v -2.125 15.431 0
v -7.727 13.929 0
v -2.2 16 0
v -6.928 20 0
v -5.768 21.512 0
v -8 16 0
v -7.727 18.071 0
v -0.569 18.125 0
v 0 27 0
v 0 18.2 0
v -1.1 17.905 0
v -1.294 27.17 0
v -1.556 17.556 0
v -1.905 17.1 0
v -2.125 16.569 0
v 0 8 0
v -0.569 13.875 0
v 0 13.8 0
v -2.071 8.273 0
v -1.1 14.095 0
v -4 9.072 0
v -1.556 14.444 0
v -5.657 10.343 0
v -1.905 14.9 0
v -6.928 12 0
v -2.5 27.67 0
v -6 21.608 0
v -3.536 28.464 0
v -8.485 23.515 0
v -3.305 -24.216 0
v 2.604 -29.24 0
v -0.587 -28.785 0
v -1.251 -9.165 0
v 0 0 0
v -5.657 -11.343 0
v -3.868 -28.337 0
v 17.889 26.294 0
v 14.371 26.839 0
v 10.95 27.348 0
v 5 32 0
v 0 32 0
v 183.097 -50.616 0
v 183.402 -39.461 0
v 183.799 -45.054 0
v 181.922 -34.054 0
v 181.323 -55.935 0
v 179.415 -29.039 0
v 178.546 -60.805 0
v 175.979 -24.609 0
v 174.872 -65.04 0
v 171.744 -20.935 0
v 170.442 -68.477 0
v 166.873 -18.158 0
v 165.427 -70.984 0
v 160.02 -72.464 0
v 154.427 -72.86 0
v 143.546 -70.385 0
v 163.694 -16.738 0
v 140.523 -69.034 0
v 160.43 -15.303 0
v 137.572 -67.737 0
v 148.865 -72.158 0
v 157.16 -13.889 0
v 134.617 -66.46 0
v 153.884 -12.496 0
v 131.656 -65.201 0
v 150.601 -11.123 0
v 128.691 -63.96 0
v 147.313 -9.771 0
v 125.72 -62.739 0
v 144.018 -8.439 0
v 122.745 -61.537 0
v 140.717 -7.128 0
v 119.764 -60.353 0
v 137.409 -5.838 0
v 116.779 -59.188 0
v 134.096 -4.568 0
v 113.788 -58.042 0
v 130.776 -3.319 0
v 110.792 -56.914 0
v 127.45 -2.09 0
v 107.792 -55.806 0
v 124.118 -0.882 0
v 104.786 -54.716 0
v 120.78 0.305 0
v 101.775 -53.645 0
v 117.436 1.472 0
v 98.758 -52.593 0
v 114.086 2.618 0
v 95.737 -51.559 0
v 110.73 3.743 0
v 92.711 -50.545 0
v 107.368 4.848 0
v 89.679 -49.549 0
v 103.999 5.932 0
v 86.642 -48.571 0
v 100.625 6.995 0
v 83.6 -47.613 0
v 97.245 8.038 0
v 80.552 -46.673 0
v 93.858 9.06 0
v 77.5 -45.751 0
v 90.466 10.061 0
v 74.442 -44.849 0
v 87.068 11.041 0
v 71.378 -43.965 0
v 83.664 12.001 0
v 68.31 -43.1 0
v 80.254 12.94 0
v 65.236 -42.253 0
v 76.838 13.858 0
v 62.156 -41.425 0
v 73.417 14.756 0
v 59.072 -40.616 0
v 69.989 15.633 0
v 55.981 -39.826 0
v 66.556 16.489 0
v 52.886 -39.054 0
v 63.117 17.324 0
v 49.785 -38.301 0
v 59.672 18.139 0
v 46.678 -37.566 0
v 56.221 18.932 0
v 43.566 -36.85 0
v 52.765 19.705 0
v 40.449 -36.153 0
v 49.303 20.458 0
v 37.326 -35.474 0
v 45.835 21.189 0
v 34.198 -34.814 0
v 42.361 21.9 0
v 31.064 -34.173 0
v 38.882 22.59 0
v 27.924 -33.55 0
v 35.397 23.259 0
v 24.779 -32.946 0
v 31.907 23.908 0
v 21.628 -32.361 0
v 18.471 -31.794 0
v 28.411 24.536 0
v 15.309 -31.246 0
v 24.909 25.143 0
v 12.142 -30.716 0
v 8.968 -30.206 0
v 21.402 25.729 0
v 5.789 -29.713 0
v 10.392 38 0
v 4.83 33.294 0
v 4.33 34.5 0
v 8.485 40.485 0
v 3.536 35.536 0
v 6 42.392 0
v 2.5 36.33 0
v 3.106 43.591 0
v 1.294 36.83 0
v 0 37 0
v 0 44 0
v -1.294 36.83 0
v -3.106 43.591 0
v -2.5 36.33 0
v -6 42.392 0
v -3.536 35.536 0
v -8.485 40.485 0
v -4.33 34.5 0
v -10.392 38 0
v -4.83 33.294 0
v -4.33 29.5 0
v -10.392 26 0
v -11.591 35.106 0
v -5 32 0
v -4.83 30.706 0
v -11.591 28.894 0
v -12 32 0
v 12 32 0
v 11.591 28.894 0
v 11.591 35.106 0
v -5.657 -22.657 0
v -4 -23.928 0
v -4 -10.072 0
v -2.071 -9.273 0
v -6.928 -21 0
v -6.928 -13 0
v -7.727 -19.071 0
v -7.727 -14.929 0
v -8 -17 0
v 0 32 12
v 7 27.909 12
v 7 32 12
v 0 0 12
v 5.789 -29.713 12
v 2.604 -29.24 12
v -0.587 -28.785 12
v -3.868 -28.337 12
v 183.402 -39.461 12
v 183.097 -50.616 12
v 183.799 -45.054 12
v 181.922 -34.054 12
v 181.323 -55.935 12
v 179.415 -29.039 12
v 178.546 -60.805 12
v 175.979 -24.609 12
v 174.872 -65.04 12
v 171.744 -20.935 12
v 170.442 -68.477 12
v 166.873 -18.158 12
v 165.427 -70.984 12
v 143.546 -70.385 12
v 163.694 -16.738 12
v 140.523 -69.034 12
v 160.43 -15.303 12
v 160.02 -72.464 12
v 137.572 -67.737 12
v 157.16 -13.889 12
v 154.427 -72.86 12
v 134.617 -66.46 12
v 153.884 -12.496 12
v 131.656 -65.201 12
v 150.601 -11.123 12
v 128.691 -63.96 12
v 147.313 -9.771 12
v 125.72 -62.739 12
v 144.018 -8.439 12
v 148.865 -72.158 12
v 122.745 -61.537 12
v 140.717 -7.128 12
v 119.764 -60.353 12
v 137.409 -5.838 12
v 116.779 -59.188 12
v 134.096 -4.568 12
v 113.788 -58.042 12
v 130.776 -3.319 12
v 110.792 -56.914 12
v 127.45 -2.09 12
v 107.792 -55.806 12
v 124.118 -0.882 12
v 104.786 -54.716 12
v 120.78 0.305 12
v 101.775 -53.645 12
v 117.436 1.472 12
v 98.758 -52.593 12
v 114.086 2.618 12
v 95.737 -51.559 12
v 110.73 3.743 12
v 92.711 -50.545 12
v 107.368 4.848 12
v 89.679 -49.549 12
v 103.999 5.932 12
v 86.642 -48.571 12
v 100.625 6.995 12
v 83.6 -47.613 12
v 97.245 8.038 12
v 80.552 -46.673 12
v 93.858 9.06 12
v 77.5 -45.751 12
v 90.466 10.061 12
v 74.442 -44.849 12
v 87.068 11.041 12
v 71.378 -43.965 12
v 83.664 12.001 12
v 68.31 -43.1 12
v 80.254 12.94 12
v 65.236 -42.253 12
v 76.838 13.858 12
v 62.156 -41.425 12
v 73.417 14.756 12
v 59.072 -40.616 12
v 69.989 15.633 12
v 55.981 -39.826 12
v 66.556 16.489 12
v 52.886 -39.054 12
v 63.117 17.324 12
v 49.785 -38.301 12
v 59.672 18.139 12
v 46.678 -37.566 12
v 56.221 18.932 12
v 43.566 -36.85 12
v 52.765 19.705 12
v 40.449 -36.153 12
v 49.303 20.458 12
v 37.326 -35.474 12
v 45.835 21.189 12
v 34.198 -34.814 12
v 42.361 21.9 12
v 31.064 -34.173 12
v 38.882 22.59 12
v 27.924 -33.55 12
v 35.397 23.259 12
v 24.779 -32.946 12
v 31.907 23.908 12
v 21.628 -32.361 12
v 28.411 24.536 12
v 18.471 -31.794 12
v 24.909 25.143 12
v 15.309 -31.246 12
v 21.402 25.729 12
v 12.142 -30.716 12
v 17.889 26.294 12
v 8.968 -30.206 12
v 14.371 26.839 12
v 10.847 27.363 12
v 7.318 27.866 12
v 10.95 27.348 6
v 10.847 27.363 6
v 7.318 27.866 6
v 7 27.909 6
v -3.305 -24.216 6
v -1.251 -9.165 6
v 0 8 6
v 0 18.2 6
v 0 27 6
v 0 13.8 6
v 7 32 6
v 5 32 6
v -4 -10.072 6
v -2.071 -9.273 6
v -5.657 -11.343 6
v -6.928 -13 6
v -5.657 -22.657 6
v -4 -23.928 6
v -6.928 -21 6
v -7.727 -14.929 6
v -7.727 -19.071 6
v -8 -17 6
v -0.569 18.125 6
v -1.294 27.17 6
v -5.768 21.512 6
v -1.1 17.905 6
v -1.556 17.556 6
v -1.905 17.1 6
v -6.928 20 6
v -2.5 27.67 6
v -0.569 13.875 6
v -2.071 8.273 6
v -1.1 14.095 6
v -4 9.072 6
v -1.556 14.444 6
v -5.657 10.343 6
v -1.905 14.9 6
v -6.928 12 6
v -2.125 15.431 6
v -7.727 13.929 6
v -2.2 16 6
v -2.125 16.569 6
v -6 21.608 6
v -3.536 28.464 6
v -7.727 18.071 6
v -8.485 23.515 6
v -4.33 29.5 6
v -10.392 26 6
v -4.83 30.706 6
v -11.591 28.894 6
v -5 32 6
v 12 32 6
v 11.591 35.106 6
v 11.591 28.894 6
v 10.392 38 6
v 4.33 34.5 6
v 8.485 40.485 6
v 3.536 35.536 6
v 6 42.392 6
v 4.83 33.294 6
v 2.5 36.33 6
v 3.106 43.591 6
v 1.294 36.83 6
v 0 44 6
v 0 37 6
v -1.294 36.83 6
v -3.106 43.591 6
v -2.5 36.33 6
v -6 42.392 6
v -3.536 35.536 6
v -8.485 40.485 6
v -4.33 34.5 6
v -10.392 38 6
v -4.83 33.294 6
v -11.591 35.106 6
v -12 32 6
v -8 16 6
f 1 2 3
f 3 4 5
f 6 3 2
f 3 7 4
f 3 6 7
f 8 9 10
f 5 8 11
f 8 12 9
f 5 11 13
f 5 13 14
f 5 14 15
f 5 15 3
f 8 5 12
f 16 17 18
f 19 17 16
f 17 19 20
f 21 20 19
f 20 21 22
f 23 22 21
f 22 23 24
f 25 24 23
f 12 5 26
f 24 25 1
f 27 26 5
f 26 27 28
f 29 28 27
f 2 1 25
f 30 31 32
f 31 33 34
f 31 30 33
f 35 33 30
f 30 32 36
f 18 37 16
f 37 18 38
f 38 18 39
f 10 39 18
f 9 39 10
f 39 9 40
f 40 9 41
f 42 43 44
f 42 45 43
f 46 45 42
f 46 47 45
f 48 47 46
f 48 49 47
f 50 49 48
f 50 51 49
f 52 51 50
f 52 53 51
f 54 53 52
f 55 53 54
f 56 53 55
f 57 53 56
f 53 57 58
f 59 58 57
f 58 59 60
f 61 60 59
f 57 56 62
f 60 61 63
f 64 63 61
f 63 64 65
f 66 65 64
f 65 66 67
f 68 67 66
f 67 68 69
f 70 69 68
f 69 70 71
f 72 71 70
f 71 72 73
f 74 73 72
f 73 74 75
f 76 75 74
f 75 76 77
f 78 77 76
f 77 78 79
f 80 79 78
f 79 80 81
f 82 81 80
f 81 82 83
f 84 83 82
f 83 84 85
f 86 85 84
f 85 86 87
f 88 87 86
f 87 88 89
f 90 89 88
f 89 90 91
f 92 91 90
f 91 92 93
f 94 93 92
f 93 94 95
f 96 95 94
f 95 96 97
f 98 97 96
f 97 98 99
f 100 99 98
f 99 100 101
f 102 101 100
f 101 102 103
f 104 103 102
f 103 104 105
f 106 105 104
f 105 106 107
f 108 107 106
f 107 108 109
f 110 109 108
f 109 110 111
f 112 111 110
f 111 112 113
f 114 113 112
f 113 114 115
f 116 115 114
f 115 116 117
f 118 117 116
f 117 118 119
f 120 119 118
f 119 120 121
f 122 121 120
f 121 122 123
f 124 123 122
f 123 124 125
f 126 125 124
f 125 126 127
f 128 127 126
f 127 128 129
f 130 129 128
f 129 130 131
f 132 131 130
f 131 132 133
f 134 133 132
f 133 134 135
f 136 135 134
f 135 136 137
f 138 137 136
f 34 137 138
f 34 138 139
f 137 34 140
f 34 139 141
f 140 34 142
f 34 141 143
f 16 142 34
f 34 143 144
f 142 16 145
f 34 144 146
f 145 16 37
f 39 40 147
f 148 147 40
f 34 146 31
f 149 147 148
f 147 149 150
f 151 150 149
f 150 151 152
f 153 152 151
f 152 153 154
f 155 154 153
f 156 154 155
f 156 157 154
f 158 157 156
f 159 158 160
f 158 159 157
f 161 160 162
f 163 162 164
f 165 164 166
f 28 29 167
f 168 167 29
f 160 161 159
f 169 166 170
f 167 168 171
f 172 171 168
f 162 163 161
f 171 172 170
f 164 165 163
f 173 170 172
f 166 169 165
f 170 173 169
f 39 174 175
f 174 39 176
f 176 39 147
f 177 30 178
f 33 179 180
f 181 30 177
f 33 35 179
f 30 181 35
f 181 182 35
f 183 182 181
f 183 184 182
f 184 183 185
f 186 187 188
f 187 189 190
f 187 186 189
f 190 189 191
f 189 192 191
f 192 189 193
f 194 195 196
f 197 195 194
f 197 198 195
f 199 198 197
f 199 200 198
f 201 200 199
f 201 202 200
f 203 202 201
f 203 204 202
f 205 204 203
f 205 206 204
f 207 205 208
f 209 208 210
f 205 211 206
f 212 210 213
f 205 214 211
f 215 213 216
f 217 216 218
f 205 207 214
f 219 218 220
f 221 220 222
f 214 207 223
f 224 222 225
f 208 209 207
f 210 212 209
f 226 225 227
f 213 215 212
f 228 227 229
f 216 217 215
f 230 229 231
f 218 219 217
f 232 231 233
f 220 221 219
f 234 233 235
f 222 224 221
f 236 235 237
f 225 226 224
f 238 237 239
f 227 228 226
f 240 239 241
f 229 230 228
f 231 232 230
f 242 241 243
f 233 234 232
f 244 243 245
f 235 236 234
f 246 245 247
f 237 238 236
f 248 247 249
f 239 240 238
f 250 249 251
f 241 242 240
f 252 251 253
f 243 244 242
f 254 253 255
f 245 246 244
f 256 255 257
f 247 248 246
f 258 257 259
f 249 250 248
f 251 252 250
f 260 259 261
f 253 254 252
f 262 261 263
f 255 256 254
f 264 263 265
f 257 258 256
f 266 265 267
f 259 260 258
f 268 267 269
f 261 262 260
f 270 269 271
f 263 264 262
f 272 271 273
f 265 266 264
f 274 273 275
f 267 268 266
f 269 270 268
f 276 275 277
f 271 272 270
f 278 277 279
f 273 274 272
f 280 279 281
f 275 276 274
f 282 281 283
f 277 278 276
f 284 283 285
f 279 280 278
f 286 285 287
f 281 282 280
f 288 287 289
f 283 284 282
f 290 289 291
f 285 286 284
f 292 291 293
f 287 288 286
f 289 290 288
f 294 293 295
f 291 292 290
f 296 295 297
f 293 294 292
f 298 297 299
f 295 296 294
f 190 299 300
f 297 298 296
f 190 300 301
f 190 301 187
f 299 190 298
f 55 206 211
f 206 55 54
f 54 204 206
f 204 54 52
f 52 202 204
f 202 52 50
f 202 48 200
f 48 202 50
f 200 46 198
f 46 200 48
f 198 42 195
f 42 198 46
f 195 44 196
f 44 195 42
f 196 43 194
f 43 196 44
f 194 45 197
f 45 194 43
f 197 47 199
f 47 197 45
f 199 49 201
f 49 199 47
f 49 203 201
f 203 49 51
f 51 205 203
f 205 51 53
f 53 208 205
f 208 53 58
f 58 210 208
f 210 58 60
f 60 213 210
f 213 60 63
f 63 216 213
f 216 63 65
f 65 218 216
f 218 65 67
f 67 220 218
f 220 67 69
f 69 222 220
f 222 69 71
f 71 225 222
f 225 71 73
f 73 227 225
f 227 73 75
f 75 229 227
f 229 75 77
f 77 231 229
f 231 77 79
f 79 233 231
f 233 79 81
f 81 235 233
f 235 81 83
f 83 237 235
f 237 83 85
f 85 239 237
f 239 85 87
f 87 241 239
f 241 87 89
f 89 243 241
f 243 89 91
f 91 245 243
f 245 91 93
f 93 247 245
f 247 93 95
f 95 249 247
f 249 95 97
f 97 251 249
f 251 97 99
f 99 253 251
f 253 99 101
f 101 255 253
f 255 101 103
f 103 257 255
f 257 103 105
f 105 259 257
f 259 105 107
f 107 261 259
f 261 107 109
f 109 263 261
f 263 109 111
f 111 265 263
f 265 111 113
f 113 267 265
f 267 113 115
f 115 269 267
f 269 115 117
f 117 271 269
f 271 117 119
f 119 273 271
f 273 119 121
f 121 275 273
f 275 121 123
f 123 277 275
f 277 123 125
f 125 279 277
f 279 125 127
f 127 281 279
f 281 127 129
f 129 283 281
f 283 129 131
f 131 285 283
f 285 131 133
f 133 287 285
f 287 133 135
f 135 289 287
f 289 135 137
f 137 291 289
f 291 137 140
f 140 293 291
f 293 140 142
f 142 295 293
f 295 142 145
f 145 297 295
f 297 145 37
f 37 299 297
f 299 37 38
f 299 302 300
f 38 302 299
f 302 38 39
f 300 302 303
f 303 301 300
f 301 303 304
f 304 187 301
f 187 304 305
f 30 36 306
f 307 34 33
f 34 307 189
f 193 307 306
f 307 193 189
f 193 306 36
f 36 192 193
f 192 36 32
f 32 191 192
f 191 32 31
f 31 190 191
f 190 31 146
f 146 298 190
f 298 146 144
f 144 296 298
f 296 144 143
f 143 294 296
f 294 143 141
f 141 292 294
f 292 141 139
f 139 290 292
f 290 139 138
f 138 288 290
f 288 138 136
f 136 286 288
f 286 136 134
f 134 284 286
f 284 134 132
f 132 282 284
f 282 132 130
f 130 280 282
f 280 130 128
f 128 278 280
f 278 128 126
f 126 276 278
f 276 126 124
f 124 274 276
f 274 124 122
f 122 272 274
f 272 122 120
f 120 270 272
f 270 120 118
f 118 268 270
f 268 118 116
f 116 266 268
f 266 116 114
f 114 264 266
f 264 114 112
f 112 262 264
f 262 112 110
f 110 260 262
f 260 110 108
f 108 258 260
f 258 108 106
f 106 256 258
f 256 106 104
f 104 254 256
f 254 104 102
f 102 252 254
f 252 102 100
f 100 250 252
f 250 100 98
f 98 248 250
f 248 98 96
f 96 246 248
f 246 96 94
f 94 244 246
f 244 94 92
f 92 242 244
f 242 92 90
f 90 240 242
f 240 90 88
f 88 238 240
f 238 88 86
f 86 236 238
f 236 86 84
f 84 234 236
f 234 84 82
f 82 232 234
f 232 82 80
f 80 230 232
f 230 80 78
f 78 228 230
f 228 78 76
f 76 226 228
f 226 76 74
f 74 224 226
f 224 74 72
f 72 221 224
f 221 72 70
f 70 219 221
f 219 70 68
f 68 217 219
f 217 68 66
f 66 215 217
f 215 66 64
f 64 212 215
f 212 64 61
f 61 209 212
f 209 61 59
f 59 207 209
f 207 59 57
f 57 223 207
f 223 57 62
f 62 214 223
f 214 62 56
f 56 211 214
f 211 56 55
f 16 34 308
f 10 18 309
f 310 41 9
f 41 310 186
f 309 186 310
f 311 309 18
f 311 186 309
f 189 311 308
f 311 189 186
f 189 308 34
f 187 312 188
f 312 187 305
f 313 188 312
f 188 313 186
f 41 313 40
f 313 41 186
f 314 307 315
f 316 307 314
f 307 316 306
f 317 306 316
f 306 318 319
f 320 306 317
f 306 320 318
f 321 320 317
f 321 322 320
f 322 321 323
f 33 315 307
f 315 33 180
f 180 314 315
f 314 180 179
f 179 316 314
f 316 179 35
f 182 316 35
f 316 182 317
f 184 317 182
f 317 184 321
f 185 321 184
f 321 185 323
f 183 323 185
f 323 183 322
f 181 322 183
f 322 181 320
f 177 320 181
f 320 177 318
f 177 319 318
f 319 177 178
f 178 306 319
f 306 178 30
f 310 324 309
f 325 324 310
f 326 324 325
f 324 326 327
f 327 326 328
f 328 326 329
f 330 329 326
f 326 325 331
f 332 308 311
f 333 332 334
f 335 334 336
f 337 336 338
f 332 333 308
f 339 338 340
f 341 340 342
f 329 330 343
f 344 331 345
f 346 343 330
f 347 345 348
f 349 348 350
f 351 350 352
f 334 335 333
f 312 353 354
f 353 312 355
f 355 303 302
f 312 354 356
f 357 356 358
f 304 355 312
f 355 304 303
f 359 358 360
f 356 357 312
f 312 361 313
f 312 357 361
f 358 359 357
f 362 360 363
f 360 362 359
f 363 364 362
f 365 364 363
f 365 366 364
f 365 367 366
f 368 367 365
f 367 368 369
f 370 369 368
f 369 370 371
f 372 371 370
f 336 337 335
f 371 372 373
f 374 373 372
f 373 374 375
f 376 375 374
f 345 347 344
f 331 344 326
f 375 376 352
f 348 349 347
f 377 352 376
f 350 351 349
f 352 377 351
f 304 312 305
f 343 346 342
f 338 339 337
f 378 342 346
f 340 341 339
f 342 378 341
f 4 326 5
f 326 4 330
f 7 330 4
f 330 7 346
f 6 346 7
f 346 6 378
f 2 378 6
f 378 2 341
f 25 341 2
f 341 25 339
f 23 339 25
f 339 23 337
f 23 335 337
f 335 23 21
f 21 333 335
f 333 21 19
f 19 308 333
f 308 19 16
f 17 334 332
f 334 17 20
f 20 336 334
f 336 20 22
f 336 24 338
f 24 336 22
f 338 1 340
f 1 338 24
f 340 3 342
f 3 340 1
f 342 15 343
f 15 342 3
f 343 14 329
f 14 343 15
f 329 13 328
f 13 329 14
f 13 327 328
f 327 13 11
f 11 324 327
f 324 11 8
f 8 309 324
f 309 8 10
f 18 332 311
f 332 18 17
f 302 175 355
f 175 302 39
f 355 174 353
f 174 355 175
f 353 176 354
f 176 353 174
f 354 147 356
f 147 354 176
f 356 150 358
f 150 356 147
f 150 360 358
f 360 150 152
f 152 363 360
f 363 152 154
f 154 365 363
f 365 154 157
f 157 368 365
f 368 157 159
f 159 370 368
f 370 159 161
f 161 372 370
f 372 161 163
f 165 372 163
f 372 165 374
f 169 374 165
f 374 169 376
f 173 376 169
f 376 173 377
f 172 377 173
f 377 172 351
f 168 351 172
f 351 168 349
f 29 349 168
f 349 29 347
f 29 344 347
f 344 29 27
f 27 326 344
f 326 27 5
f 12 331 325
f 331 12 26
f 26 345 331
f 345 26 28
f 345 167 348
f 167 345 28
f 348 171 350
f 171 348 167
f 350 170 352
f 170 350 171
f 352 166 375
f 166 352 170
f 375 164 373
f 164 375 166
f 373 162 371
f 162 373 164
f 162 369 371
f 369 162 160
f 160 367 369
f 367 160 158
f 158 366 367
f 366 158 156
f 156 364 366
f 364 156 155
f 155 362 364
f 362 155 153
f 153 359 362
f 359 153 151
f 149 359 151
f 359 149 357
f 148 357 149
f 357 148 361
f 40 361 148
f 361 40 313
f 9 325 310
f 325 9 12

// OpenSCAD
// hanger-split: half w19 w=19 cm slope=15.92 deg bow=0.59 cm r=2.86 cm depth=12.0 mm
// Print this half twice, flat. Turn the second half 180 degrees about the vertical axis, lay the
// bosses together and clamp with two M4 bolts through the 4.4 mm holes.
// Generated by hanger_split.split.scad; not rendered in this run (no OpenSCAD in the image).
depth = 12.0;
union() {
  linear_extrude(height = 12) polygon([[3.868, 28.337], [7.318, 27.866], [10.847, 27.363], [14.371, 26.839], [17.889, 26.294], [21.402, 25.729], [24.909, 25.143], [28.411, 24.536], [31.907, 23.908], [35.397, 23.259], [38.882, 22.590], [42.361, 21.900], [45.835, 21.189], [49.303, 20.458], [52.765, 19.705], [56.221, 18.932], [59.672, 18.139], [63.117, 17.324], [66.556, 16.489], [69.989, 15.633], [73.417, 14.756], [76.838, 13.858], [80.254, 12.940], [83.664, 12.001], [87.068, 11.041], [90.466, 10.061], [93.858, 9.060], [97.245, 8.038], [100.625, 6.995], [103.999, 5.932], [107.368, 4.848], [110.730, 3.743], [114.086, 2.618], [117.436, 1.472], [120.780, 0.305], [124.118, -0.882], [127.450, -2.090], [130.776, -3.319], [134.096, -4.568], [137.409, -5.838], [140.717, -7.128], [144.018, -8.439], [147.313, -9.771], [150.601, -11.123], [153.884, -12.496], [157.160, -13.889], [160.430, -15.303], [163.694, -16.738], [166.873, -18.158], [171.744, -20.935], [175.979, -24.609], [179.415, -29.039], [181.922, -34.054], [183.402, -39.461], [183.799, -45.054], [183.097, -50.616], [181.323, -55.935], [178.546, -60.805], [174.872, -65.040], [170.442, -68.477], [165.427, -70.984], [160.020, -72.464], [154.427, -72.860], [148.865, -72.158], [143.546, -70.385], [140.523, -69.034], [137.572, -67.737], [134.617, -66.460], [131.656, -65.201], [128.691, -63.960], [125.720, -62.739], [122.745, -61.537], [119.764, -60.353], [116.779, -59.188], [113.788, -58.042], [110.792, -56.914], [107.792, -55.806], [104.786, -54.716], [101.775, -53.645], [98.758, -52.593], [95.737, -51.559], [92.711, -50.545], [89.679, -49.549], [86.642, -48.571], [83.600, -47.613], [80.552, -46.673], [77.500, -45.751], [74.442, -44.849], [71.378, -43.965], [68.310, -43.100], [65.236, -42.253], [62.156, -41.425], [59.072, -40.616], [55.981, -39.826], [52.886, -39.054], [49.785, -38.301], [46.678, -37.566], [43.566, -36.850], [40.449, -36.153], [37.326, -35.474], [34.198, -34.814], [31.064, -34.173], [27.924, -33.550], [24.779, -32.946], [21.628, -32.361], [18.471, -31.794], [15.309, -31.246], [12.142, -30.716], [8.968, -30.206], [5.789, -29.713], [2.604, -29.240], [-0.587, -28.785], [-3.868, -28.337]]);
  linear_extrude(height = 12) polygon([[0.000, -28.600], [7.402, -27.625], [14.300, -24.768], [20.223, -20.223], [24.768, -14.300], [27.625, -7.402], [28.600, -0.000], [27.625, 7.402], [24.768, 14.300], [20.223, 20.223], [14.300, 24.768], [7.402, 27.625], [0.000, 28.600]]);
  linear_extrude(height = 12) polygon([[0.000, 0.000], [7.000, 0.000], [7.000, 32.000], [0.000, 32.000]]);
  linear_extrude(height = 6) difference() { polygon([[8.000, -17.000], [7.727, -14.929], [6.928, -13.000], [5.657, -11.343], [4.000, -10.072], [2.071, -9.273], [0.000, -9.000], [-2.071, -9.273], [-4.000, -10.072], [-5.657, -11.343], [-6.928, -13.000], [-7.727, -14.929], [-8.000, -17.000], [-7.727, -19.071], [-6.928, -21.000], [-5.657, -22.657], [-4.000, -23.928], [-2.071, -24.727], [-0.000, -25.000], [2.071, -24.727], [4.000, -23.928], [5.657, -22.657], [6.928, -21.000], [7.727, -19.071]]); polygon([[2.200, -17.000], [2.125, -16.431], [1.905, -15.900], [1.556, -15.444], [1.100, -15.095], [0.569, -14.875], [0.000, -14.800], [-0.569, -14.875], [-1.100, -15.095], [-1.556, -15.444], [-1.905, -15.900], [-2.125, -16.431], [-2.200, -17.000], [-2.125, -17.569], [-1.905, -18.100], [-1.556, -18.556], [-1.100, -18.905], [-0.569, -19.125], [-0.000, -19.200], [0.569, -19.125], [1.100, -18.905], [1.556, -18.556], [1.905, -18.100], [2.125, -17.569]]); }
  linear_extrude(height = 6) difference() { polygon([[8.000, 16.000], [7.727, 18.071], [6.928, 20.000], [5.657, 21.657], [4.000, 22.928], [2.071, 23.727], [0.000, 24.000], [-2.071, 23.727], [-4.000, 22.928], [-5.657, 21.657], [-6.928, 20.000], [-7.727, 18.071], [-8.000, 16.000], [-7.727, 13.929], [-6.928, 12.000], [-5.657, 10.343], [-4.000, 9.072], [-2.071, 8.273], [-0.000, 8.000], [2.071, 8.273], [4.000, 9.072], [5.657, 10.343], [6.928, 12.000], [7.727, 13.929]]); polygon([[2.200, 16.000], [2.125, 16.569], [1.905, 17.100], [1.556, 17.556], [1.100, 17.905], [0.569, 18.125], [0.000, 18.200], [-0.569, 18.125], [-1.100, 17.905], [-1.556, 17.556], [-1.905, 17.100], [-2.125, 16.569], [-2.200, 16.000], [-2.125, 15.431], [-1.905, 14.900], [-1.556, 14.444], [-1.100, 14.095], [-0.569, 13.875], [-0.000, 13.800], [0.569, 13.875], [1.100, 14.095], [1.556, 14.444], [1.905, 14.900], [2.125, 15.431]]); }
  linear_extrude(height = 6) difference() { polygon([[12.000, 32.000], [11.591, 35.106], [10.392, 38.000], [8.485, 40.485], [6.000, 42.392], [3.106, 43.591], [0.000, 44.000], [-3.106, 43.591], [-6.000, 42.392], [-8.485, 40.485], [-10.392, 38.000], [-11.591, 35.106], [-12.000, 32.000], [-11.591, 28.894], [-10.392, 26.000], [-8.485, 23.515], [-6.000, 21.608], [-3.106, 20.409], [-0.000, 20.000], [3.106, 20.409], [6.000, 21.608], [8.485, 23.515], [10.392, 26.000], [11.591, 28.894]]); polygon([[5.000, 32.000], [4.830, 33.294], [4.330, 34.500], [3.536, 35.536], [2.500, 36.330], [1.294, 36.830], [0.000, 37.000], [-1.294, 36.830], [-2.500, 36.330], [-3.536, 35.536], [-4.330, 34.500], [-4.830, 33.294], [-5.000, 32.000], [-4.830, 30.706], [-4.330, 29.500], [-3.536, 28.464], [-2.500, 27.670], [-1.294, 27.170], [-0.000, 27.000], [1.294, 27.170], [2.500, 27.670], [3.536, 28.464], [4.330, 29.500], [4.830, 30.706]]); }
}
